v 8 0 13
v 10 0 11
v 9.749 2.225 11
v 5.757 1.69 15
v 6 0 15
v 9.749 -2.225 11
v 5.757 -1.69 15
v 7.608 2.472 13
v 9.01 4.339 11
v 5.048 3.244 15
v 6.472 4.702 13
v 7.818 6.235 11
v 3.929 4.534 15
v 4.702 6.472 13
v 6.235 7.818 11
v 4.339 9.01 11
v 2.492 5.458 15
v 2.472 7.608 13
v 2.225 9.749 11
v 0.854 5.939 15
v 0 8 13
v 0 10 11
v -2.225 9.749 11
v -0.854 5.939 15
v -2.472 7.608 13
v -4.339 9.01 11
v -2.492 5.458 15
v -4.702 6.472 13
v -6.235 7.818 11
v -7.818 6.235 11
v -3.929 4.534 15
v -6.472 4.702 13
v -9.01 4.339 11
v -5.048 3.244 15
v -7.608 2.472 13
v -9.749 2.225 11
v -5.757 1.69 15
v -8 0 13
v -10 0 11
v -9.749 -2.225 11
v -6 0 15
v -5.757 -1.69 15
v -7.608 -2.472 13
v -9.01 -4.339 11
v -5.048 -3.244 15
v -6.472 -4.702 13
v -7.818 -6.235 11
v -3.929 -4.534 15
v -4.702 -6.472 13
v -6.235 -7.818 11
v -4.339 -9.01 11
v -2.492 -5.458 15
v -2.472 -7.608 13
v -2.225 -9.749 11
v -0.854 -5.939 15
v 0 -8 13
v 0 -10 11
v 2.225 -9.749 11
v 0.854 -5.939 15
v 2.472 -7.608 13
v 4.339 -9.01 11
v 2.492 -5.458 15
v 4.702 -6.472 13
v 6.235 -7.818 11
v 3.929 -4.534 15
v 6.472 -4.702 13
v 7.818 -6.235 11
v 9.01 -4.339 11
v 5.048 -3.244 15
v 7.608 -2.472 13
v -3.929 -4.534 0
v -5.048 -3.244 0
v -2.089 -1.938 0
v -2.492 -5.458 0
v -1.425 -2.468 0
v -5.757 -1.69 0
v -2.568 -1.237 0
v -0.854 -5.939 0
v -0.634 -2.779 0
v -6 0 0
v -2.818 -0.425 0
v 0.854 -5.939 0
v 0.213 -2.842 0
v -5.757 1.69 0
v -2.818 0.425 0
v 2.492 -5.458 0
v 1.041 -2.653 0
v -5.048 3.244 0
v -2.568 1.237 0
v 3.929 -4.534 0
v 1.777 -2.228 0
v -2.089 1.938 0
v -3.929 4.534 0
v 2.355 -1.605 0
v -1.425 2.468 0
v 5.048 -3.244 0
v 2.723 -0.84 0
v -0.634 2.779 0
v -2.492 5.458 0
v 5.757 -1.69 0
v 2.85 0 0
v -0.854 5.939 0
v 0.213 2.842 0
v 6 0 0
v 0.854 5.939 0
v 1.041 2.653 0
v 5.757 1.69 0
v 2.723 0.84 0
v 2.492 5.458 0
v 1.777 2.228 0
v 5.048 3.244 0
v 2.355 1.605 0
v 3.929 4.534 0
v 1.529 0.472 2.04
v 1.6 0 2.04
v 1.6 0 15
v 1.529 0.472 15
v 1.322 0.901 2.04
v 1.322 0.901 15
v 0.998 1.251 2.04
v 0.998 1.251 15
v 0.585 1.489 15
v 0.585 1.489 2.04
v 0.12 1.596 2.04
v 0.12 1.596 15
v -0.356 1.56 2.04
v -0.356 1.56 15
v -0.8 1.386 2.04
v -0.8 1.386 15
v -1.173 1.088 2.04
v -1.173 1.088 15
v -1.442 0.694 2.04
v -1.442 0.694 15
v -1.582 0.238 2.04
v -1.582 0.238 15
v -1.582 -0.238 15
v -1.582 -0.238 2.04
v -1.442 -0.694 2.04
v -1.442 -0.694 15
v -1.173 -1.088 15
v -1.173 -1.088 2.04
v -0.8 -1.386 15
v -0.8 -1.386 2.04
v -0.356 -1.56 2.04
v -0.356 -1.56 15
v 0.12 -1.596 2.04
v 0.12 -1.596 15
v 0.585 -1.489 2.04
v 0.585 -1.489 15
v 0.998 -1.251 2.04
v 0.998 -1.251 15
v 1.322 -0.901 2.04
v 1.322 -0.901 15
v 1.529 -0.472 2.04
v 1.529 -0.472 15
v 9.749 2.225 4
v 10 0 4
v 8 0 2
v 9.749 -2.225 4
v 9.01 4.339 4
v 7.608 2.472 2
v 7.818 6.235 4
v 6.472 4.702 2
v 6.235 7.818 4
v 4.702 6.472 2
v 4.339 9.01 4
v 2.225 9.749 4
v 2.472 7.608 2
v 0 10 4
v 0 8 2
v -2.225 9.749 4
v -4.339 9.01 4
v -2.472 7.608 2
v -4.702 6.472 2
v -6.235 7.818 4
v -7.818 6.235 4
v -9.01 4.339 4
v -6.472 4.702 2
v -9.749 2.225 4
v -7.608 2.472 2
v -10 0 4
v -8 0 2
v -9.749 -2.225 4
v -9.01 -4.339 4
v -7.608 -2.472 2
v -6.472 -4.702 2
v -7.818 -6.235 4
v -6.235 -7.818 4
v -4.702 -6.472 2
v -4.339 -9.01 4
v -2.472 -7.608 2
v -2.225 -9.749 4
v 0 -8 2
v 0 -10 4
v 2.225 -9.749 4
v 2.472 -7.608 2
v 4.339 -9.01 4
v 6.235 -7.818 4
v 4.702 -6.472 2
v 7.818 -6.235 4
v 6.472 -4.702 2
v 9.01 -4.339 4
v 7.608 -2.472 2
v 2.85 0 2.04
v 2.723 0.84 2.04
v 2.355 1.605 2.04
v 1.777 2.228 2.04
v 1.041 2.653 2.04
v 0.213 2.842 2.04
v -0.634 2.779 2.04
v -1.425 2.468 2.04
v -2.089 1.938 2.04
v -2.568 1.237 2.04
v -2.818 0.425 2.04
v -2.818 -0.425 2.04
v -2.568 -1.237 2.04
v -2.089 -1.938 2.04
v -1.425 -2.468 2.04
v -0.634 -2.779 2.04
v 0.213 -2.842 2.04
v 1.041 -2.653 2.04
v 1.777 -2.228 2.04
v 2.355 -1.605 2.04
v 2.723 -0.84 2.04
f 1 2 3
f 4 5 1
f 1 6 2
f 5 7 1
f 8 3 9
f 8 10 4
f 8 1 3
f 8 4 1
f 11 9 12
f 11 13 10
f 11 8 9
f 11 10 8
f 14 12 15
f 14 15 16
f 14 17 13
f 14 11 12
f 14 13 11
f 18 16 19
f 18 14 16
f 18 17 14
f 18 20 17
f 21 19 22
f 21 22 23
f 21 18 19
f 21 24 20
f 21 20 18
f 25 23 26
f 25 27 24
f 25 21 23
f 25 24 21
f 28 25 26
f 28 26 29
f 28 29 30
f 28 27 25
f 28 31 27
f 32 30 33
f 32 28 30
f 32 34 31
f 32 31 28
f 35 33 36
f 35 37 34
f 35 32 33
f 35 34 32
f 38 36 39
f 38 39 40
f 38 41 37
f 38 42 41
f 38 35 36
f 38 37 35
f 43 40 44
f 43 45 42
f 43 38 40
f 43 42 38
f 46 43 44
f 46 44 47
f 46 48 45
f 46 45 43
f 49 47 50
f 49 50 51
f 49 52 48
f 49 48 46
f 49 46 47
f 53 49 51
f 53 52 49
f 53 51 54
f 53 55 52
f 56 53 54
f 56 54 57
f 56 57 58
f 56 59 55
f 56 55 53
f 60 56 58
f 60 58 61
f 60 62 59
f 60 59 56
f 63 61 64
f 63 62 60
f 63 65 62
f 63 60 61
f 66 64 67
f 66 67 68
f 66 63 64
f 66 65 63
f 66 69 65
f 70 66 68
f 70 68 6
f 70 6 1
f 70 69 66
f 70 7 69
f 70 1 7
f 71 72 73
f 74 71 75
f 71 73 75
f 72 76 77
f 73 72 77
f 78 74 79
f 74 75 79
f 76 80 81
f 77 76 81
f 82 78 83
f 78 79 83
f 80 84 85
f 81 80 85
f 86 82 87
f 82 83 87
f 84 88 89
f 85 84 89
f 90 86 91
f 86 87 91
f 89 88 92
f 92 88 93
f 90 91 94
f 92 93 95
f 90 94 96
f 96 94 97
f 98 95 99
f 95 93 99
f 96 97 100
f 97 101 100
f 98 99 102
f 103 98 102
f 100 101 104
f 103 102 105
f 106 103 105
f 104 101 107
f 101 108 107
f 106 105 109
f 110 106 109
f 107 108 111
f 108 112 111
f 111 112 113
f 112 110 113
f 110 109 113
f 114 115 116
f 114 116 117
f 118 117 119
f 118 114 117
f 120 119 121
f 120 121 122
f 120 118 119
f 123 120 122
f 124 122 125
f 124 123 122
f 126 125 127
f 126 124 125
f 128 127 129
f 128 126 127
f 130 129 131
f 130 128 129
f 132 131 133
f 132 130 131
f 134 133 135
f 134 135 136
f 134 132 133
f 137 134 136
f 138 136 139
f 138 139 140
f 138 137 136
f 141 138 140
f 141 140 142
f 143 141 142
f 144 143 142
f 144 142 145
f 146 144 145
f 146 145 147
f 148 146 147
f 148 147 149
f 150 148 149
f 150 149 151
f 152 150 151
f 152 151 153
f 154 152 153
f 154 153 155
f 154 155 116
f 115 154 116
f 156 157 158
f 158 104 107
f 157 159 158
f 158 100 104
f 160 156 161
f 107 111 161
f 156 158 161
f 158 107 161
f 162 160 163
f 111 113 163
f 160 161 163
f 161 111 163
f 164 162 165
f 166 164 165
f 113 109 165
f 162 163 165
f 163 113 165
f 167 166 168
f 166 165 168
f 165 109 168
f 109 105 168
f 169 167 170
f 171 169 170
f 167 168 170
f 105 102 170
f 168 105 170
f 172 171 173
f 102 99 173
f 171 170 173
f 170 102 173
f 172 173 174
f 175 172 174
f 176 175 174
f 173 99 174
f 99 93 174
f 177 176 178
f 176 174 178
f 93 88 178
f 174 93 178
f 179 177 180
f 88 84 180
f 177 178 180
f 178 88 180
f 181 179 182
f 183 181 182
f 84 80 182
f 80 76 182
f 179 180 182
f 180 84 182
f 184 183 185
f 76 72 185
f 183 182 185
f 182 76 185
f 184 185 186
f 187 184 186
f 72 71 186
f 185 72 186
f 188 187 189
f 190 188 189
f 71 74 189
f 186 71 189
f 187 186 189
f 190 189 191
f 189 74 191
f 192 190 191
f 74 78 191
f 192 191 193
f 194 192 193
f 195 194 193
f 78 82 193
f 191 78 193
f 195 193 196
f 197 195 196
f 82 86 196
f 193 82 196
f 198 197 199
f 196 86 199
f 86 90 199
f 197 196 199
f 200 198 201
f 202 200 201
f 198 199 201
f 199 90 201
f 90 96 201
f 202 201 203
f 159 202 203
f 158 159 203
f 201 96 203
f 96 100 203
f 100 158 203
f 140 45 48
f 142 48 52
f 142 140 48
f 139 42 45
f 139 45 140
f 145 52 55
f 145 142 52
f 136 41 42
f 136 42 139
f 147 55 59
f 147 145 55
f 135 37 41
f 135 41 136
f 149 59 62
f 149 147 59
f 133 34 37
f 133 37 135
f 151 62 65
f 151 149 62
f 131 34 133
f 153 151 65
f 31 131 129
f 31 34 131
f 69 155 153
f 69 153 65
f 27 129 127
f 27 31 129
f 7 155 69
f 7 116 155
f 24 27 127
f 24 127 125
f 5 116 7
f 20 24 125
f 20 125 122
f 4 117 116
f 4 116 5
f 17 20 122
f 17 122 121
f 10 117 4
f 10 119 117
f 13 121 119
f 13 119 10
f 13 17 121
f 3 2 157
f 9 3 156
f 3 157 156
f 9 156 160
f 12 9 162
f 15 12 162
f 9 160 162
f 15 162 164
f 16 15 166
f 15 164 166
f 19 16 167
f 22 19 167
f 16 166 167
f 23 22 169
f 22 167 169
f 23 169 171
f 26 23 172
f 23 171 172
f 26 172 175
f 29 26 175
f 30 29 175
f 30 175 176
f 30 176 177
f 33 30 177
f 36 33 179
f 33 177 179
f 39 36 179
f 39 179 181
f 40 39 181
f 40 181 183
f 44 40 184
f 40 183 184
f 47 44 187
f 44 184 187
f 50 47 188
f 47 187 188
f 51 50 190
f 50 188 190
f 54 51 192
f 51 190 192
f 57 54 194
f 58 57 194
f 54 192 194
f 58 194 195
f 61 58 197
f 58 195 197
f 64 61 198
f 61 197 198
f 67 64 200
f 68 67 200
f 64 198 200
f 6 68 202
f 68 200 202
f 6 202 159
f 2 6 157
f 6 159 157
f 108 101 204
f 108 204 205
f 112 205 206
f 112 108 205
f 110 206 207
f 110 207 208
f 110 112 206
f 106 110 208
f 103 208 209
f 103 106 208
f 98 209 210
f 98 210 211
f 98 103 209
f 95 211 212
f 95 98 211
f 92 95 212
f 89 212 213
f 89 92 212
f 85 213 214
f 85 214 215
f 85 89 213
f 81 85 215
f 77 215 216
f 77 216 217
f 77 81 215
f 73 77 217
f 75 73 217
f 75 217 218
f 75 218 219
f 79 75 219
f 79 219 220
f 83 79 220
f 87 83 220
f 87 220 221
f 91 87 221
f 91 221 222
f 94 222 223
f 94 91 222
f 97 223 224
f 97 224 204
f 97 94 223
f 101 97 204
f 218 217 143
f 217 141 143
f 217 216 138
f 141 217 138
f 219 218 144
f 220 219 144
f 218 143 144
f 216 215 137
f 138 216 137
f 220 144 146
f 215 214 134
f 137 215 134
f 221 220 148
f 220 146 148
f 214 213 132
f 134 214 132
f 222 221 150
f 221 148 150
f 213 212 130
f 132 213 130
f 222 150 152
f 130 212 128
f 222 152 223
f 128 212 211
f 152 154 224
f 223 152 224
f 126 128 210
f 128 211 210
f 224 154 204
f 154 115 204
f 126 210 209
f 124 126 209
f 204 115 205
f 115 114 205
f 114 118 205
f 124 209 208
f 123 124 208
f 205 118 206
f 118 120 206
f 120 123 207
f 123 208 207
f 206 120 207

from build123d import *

# Parameters (mm, degrees)
F0_R     = 10
F0_R_2   = 2.85
F0_R_3   = 1.6
F1_DEPTH = 15
F2_SIZE  = 4
F3_DEPTH = 2.04


with BuildPart() as f1:
    # F0 (on Top) → F1 (new body)
    with BuildSketch(Plane.XY):
        Circle(F0_R)
        Circle(F0_R_2, mode=Mode.SUBTRACT)
        Circle(F0_R_2)
        Circle(F0_R_3, mode=Mode.SUBTRACT)
    extrude(amount=F1_DEPTH)

    # F2
    f2_edges = [f1.edges().sort_by_distance(p)[0] for p in [
        (10, 0, 7.5),
        (-10, 0, 0),
        (-10, 0, 15),
    ]]
    chamfer(f2_edges, length=F2_SIZE)

    # F0 (on Top) → F3 (cut)
    with BuildSketch(Plane.XY):
        Circle(F0_R_2)
        Circle(F0_R_3, mode=Mode.SUBTRACT)
    extrude(amount=F3_DEPTH, mode=Mode.SUBTRACT)


solid = f1.part
